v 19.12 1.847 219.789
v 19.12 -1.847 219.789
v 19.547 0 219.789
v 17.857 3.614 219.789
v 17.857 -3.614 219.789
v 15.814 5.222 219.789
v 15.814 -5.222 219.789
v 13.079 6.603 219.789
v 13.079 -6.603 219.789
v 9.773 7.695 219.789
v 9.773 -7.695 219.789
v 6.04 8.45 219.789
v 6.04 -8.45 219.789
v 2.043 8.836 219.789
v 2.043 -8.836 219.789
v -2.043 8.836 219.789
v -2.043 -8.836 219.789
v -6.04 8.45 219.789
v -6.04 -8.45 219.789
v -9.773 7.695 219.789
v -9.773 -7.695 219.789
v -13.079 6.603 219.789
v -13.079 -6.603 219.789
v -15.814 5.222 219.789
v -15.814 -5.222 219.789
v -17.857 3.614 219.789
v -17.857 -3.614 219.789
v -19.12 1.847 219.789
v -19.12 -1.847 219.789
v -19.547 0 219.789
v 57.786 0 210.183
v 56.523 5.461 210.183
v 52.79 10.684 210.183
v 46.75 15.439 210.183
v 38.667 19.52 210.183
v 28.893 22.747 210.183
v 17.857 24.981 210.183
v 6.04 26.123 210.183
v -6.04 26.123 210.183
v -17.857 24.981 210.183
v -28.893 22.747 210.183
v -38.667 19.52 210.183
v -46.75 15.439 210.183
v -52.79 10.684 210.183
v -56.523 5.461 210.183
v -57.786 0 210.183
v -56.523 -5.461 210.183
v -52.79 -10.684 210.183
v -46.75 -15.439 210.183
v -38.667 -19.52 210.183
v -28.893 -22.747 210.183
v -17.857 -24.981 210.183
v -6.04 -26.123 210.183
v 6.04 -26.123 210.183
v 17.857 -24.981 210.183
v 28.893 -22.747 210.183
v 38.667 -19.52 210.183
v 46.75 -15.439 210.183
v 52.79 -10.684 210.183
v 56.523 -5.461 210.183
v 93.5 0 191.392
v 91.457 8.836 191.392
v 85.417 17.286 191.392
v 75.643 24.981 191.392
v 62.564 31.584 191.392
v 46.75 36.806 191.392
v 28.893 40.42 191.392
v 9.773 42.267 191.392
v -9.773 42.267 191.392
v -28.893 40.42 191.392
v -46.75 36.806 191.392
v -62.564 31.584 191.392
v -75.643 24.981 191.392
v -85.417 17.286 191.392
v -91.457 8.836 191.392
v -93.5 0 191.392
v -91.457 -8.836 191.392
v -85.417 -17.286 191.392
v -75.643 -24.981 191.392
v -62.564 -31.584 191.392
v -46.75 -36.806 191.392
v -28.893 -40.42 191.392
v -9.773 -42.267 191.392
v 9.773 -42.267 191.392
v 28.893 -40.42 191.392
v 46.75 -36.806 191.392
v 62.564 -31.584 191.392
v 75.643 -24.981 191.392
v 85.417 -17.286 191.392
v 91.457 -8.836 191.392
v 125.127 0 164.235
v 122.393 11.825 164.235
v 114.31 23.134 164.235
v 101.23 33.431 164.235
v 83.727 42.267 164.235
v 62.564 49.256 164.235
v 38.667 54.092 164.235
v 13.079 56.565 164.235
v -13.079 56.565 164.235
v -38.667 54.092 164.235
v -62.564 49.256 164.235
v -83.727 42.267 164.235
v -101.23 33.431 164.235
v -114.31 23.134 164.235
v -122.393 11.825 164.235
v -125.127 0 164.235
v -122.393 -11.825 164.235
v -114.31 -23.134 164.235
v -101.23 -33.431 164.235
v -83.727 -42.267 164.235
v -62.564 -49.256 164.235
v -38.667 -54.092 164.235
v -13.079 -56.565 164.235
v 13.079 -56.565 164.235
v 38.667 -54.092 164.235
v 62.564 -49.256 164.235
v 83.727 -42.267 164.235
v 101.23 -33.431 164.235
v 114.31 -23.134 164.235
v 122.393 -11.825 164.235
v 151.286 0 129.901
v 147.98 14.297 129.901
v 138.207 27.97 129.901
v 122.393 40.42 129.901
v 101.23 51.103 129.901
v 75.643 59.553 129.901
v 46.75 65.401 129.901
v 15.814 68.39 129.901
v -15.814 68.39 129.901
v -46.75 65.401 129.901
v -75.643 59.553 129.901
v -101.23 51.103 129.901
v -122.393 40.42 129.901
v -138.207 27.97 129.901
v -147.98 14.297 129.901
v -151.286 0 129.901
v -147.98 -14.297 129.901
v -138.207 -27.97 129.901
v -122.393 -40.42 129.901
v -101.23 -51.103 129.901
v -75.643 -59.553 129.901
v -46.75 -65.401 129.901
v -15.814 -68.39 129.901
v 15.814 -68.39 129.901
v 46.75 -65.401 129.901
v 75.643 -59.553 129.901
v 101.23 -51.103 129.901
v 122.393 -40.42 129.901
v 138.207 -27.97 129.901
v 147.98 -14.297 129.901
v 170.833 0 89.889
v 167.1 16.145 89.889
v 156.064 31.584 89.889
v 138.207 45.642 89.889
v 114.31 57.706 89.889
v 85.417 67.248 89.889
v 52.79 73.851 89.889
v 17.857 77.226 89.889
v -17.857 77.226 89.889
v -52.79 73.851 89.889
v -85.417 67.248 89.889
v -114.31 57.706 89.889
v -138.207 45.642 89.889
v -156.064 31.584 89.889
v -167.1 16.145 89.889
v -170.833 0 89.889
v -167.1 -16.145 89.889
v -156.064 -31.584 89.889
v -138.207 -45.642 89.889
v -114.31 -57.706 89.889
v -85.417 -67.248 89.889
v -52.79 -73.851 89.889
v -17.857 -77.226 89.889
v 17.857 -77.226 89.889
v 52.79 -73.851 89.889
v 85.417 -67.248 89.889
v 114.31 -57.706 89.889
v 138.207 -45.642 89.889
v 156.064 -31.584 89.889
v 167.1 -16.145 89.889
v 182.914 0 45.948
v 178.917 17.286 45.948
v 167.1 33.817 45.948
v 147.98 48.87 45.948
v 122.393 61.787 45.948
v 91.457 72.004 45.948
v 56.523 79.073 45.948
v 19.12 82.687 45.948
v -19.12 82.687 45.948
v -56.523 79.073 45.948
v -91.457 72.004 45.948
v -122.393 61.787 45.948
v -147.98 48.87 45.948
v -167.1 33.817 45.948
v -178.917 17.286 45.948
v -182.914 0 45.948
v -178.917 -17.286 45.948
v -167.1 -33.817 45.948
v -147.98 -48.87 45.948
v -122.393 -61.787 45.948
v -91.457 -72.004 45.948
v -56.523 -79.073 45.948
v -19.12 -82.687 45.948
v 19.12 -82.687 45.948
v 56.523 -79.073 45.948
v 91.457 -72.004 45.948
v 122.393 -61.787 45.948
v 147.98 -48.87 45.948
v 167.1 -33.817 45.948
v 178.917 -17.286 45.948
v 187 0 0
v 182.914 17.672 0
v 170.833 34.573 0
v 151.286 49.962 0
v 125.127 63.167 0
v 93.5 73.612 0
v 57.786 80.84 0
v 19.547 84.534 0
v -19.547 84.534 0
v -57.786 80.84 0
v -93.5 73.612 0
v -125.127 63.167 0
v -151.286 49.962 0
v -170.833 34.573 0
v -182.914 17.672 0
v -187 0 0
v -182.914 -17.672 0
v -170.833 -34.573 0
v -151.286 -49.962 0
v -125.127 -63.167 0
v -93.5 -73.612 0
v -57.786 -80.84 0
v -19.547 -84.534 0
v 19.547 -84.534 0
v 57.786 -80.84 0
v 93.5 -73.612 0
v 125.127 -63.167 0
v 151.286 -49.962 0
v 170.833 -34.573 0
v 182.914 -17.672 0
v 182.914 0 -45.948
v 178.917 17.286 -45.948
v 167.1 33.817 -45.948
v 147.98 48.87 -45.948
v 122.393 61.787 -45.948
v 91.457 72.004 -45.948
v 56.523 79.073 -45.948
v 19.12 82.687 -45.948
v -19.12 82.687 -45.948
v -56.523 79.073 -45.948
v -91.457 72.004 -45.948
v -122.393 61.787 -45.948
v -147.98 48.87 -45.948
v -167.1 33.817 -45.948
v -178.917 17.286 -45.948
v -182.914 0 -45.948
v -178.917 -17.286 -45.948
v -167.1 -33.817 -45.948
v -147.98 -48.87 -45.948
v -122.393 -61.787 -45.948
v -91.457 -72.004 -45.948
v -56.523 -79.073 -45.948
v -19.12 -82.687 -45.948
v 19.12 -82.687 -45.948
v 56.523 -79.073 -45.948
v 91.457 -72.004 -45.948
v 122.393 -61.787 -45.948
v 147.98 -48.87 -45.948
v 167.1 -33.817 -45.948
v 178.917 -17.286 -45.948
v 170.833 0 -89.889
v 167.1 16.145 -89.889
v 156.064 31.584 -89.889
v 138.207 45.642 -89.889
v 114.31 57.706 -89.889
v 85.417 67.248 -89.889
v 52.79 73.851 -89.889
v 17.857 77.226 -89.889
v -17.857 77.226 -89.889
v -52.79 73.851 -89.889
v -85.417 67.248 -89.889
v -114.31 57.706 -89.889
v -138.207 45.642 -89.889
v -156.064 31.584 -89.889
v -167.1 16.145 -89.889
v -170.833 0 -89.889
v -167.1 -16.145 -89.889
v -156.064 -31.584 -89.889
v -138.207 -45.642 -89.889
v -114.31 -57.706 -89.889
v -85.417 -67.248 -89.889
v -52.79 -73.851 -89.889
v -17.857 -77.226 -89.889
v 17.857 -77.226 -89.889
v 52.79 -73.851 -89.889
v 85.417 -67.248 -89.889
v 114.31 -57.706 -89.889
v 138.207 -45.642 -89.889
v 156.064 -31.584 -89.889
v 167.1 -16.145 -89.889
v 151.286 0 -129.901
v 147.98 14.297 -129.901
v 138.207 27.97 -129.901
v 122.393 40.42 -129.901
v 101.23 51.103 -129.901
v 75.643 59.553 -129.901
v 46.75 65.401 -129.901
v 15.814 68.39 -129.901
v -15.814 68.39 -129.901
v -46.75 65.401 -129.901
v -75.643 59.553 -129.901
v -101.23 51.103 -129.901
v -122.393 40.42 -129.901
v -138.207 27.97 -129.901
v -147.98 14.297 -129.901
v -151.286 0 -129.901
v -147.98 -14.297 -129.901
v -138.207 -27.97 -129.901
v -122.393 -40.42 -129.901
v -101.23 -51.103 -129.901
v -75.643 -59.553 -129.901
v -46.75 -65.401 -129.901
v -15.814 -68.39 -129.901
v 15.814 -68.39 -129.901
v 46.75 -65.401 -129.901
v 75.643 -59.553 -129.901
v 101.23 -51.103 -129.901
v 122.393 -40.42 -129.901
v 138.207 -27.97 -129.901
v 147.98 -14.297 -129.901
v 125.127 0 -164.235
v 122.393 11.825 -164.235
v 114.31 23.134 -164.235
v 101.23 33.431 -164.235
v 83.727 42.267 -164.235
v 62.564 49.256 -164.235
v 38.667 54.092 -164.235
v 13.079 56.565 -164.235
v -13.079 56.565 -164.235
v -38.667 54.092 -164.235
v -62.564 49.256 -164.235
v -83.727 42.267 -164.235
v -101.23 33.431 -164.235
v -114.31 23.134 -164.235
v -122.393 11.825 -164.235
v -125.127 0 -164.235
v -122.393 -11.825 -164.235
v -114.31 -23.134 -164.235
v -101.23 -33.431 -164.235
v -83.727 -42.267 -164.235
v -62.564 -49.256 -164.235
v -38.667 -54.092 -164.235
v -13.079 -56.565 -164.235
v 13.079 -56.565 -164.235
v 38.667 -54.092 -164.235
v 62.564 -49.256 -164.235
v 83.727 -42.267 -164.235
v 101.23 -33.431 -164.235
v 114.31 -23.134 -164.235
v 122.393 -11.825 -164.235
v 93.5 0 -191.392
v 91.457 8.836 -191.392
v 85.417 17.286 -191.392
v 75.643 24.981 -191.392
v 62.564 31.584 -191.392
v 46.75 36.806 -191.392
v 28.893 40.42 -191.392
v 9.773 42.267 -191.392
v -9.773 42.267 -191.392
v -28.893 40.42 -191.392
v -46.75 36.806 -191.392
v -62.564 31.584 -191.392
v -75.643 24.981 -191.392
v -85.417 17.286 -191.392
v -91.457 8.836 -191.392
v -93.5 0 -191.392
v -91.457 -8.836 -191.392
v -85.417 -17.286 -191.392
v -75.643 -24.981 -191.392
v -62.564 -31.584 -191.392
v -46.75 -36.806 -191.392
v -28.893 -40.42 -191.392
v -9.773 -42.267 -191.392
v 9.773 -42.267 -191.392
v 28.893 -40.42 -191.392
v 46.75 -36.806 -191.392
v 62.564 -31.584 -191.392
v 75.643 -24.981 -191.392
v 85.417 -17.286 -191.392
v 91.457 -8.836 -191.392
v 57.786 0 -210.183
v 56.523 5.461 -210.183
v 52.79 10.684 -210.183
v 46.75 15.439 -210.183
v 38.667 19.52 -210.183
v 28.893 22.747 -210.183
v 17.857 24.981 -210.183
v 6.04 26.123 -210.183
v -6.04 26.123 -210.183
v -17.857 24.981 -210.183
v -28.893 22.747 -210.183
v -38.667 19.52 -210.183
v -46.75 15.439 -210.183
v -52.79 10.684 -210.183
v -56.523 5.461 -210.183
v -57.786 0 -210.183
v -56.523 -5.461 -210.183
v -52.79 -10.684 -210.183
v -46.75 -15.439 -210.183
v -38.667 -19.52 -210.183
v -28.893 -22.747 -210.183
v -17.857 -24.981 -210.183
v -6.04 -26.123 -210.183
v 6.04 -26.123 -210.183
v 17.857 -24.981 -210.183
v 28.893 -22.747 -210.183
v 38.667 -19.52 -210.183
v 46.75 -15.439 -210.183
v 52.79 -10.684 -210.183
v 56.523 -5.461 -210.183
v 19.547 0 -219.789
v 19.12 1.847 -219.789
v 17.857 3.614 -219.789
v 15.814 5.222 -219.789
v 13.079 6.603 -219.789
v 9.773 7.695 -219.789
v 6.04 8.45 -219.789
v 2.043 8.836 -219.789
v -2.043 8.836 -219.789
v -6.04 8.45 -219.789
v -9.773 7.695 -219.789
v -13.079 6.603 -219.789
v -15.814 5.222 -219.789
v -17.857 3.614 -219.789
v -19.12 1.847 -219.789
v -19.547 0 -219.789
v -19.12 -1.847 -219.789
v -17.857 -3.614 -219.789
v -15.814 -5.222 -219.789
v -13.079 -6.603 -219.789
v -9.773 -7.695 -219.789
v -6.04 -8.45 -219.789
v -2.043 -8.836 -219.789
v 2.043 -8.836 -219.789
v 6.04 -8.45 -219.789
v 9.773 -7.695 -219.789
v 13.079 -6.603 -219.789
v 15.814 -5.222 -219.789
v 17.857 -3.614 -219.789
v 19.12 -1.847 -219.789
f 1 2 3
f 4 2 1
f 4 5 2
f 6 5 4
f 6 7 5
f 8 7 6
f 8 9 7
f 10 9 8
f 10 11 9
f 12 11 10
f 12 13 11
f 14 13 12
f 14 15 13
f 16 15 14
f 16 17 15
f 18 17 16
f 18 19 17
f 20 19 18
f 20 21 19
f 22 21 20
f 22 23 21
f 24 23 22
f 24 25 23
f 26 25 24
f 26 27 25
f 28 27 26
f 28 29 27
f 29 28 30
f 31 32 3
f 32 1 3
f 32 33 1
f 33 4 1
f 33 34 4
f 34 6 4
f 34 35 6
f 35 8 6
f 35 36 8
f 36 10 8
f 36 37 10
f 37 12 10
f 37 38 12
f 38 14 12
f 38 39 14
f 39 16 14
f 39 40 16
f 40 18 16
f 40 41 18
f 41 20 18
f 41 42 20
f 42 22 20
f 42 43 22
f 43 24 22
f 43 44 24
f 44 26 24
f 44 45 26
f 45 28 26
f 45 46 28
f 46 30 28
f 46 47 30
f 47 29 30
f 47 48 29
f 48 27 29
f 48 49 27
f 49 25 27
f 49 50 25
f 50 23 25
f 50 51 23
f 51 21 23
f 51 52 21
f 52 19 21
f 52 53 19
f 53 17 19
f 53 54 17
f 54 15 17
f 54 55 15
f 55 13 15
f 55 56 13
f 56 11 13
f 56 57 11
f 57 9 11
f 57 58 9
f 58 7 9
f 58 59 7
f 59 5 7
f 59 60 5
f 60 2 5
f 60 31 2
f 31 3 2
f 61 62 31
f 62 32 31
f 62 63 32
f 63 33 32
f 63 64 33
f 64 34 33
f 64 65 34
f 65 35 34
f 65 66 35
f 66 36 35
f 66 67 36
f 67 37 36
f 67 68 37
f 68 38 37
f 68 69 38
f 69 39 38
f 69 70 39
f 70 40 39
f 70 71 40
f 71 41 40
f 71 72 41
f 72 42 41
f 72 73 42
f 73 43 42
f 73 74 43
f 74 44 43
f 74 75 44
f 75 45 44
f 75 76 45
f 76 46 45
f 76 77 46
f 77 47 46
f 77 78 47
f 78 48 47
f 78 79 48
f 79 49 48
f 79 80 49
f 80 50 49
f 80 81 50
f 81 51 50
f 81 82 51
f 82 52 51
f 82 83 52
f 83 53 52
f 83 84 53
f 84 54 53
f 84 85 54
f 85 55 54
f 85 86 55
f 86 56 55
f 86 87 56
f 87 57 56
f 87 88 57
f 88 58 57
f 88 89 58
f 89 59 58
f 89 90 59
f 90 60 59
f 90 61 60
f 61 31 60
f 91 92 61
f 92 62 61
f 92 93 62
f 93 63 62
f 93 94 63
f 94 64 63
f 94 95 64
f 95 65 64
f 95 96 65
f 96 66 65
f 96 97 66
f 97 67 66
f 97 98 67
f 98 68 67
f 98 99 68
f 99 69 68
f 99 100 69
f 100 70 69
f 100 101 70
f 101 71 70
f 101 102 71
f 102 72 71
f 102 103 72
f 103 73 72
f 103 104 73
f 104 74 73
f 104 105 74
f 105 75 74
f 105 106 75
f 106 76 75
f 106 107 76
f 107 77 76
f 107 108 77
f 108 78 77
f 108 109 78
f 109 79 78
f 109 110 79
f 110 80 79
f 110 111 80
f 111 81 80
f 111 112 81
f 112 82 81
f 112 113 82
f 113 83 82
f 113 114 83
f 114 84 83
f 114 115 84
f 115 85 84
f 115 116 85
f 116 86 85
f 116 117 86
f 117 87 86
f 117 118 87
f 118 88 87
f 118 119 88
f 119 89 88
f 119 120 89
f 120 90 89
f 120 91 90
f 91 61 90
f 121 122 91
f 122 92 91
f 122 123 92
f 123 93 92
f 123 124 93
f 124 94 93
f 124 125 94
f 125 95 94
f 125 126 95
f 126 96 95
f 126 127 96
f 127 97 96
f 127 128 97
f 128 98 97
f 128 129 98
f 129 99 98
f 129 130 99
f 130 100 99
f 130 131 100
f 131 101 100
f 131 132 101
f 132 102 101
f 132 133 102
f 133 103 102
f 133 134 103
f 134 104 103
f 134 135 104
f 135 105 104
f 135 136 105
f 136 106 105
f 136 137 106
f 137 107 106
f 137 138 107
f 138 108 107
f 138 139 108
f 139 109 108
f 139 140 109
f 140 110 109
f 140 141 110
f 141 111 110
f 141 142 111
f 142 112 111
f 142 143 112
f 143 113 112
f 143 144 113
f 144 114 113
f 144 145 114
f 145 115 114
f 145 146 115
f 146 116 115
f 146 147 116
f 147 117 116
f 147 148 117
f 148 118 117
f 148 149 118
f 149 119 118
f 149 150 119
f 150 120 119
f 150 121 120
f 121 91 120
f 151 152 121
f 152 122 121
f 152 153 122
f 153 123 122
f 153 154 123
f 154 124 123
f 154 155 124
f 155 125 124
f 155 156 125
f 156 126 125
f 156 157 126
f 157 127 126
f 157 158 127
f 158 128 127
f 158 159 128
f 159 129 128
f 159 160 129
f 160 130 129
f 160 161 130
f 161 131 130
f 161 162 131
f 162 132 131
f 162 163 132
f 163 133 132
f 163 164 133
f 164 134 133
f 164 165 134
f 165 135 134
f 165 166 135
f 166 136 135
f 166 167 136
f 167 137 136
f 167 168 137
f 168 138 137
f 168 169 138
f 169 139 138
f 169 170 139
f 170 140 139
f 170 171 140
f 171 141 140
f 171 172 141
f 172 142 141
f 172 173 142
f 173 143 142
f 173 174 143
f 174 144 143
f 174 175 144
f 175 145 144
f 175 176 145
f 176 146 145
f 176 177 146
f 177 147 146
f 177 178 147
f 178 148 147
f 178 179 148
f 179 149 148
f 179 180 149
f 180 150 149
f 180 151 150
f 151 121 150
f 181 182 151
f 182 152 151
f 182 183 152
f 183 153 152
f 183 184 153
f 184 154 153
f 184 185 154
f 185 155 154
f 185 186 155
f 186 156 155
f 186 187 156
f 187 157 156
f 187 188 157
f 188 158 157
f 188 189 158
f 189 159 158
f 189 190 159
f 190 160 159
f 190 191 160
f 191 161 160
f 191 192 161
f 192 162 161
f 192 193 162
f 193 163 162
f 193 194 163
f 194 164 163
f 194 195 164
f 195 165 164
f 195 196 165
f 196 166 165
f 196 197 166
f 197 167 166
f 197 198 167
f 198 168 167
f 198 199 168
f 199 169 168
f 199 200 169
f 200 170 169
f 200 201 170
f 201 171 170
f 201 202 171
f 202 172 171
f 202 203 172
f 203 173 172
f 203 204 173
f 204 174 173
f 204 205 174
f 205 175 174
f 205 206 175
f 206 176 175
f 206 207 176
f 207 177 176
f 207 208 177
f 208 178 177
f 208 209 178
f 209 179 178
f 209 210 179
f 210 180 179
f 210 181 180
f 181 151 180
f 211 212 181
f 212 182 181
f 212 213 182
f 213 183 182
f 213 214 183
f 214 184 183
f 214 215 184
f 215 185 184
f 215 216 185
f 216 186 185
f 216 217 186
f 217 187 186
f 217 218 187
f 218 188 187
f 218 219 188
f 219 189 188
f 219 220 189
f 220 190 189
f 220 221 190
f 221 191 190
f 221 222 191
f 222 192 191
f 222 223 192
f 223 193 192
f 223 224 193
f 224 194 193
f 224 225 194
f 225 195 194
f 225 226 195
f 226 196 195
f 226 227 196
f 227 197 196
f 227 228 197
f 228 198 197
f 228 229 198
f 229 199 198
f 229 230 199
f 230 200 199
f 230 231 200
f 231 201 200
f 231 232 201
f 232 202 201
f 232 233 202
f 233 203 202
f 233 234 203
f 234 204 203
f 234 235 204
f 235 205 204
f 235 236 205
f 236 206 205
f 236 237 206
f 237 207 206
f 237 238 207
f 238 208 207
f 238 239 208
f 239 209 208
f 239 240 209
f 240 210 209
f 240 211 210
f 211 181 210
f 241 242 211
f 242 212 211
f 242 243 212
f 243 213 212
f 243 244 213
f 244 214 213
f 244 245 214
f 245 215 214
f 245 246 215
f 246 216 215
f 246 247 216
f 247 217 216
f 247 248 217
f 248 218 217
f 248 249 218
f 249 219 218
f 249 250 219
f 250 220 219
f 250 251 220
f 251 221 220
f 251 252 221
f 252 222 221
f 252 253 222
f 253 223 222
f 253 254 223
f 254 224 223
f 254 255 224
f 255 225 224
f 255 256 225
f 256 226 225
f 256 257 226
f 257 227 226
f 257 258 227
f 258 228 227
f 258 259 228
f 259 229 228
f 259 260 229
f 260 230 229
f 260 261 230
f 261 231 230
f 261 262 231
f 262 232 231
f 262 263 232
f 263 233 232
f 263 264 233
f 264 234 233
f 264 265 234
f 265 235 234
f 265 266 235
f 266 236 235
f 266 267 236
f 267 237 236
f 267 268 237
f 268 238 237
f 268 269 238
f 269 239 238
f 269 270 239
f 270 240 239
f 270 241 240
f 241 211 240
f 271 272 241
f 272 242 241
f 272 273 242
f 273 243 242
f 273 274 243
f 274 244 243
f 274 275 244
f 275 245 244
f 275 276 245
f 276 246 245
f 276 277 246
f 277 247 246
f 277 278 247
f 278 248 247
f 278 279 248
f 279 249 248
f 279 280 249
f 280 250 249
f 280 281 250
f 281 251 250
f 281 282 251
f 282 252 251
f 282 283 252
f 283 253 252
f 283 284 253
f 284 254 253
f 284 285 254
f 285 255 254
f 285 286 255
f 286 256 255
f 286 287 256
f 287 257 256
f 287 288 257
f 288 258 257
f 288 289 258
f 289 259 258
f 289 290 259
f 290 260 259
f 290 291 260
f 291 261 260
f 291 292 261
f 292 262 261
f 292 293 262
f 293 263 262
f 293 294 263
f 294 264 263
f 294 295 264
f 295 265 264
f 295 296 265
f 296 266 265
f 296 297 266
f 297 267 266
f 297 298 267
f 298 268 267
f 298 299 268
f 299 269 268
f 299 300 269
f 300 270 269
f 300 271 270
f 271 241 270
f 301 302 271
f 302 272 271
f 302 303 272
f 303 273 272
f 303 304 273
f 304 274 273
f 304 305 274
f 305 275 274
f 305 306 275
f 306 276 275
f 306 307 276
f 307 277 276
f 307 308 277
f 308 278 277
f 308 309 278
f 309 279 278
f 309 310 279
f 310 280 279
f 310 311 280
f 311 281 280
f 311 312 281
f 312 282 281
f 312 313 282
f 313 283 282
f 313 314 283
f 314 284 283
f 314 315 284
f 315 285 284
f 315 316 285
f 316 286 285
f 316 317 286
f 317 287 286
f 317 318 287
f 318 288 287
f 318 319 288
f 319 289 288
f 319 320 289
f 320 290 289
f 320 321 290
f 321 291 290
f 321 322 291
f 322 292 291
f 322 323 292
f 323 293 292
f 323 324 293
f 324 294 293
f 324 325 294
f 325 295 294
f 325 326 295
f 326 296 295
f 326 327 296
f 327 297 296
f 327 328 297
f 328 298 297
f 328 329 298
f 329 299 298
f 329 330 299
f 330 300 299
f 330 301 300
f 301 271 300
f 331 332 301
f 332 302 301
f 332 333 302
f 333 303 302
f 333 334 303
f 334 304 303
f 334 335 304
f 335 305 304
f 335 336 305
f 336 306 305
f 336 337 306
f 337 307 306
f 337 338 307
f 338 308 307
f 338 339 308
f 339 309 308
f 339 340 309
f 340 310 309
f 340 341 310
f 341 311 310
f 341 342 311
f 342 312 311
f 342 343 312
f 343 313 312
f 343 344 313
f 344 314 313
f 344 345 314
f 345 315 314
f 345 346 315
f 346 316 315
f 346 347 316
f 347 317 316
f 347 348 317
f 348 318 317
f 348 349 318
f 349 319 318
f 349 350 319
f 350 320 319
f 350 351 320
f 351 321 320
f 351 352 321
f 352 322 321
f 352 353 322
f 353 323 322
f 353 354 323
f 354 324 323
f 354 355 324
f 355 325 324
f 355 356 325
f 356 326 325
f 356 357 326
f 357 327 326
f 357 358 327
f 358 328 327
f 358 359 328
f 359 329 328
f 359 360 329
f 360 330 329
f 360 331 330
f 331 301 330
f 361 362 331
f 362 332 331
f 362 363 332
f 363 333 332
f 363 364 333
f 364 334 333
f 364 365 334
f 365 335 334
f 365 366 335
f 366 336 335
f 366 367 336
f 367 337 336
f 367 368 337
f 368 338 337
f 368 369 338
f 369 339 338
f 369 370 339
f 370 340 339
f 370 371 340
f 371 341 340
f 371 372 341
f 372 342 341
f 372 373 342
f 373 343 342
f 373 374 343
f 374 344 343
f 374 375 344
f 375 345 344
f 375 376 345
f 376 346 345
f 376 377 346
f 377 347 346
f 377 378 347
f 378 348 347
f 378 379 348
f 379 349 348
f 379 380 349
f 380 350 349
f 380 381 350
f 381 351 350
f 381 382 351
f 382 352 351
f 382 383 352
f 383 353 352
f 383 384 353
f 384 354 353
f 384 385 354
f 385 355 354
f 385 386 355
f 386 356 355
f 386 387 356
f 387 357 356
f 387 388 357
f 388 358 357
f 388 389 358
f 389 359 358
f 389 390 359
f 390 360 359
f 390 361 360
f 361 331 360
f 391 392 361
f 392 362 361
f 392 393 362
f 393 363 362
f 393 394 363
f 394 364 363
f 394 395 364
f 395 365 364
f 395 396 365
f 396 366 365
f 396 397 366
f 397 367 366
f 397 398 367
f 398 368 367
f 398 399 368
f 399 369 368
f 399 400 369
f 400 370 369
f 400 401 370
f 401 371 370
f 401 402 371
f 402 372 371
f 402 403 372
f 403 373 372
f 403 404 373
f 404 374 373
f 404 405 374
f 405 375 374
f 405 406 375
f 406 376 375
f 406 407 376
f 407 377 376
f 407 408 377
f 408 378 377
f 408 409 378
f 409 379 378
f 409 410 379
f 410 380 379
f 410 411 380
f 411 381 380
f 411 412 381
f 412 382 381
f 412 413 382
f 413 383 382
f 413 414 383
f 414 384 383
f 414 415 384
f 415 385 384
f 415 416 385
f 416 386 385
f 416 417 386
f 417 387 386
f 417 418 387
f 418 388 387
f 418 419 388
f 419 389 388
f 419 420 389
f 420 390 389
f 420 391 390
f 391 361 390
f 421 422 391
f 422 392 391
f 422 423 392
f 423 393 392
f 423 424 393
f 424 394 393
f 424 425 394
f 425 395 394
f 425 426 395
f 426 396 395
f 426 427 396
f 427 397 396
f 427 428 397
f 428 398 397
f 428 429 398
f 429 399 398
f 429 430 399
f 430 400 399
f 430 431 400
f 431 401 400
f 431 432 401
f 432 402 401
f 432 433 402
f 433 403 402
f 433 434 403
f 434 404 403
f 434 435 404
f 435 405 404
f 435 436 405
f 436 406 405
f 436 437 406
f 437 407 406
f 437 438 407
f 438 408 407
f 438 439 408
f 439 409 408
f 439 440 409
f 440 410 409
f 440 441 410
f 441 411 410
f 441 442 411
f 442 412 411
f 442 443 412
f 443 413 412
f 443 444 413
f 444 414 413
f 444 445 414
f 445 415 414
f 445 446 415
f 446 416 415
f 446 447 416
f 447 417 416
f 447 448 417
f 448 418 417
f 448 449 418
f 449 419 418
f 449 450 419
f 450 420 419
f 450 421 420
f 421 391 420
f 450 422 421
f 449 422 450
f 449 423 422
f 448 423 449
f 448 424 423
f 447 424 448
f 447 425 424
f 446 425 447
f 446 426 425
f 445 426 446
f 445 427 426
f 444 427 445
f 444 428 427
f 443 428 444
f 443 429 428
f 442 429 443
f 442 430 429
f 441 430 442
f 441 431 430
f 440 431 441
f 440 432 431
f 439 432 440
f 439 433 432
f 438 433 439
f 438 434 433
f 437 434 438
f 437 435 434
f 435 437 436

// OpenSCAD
// Generated by SolidPython 1.0.1 on 2020-07-29 00:46:49


scale(v = [11, 5, 13]) {
	sphere(r = 17);
}
/***********************************************
*********      SolidPython code:      **********
************************************************
 
# import packages: SolidPython
from solid import *
from solid.utils import *
from itertools import chain, combinations, permutations


class Resize:

    def __init__(self, scad_file):
        self.scad_file = scad_file
        #self.scad_file = import_scad(scad_file)
        # cone/cylinder param:
        self.r1 = 0
        self.r2 = 0
        self.h = 0
        # rectangular prism param:
        self.w = 0
        self.l = 0
        # ellipse param:
        self.r = 0

    # import OpenScad code (file name corresponds to shape)


    # classify shape + parameters
    def assign(self, param1, param2, param3):
        if self.scad_file == 'cone.scad':
            self.r1 = param1
            self.r2 = param2
            self.h = param3
        elif self.scad_file == 'cylinder.scad':
            self.r1 = param1
            self.r2 = param2
            self.h = param3
        elif self.scad_file == 'rectangularPrism.scad':
            self.h = param1
            self.l = param2
            self.w = param3
        else:
            self.r = param1
            self.h = param2

    # resize parameters
    def iterate(self):
        x = range(3, 20, 2)
        i = 1
        if self.scad_file == 'cone.scad':
            tempList = list(permutations(x, 2))
            for temp in tempList:
                param1 = temp[0]
                param2 = temp[1]
                filepath = 'produced_scad_files/' + 'cone' + str(param1) + '_' + str(param2) + '_' + '.scad'
                scad_render_to_file(cylinder(h=param1, r1=param2, r2=0), filepath)

        elif self.scad_file == 'cylinder.scad':
            tempList = list(permutations(x, 3))
            for temp in tempList:
                param1 = temp[0]
                param2 = temp[1]
                filepath = 'produced_scad_files/' + 'cylinder' + str(param1) + '_' + str(param2) + '_' + '.scad'
                scad_render_to_file(cylinder(h=param1, r1=param2, r2=param2), filepath)

        elif self.scad_file == 'rectangularPrism.scad':
            tempList = list(permutations(x, 3))
            for temp in tempList:
                param1 = temp[0]
                param2 = temp[1]
                param3 = temp[2]
                filepath = 'produced_scad_files/' + 'rectangularPrism' + str(param1) + '_' + str(param2) + '_' + str(
                    param3) + '.scad'
                scad_render_to_file(cube(size=(param1, param2, param3)), filepath)

        elif self.scad_file == 'ellipse.scad':
            tempList = list(permutations(x, 4))
            for temp in tempList:
                param1 = temp[0]
                param2 = temp[1]
                param3 = temp[2]
                param4 = temp[3]
                filepath = 'produced_scad_files/' + 'ellipse' + str(param1) + '_' + str(param2) + '_' + str(param3) + '_' + str(param4) + '.scad'
                scad_render_to_file(scale([param1, param2, param3])(sphere(r=param4)), filepath)

    def render_to_scadfile(self):
        scad_render_to_file(scad, 'example.scad') 
 
************************************************/
